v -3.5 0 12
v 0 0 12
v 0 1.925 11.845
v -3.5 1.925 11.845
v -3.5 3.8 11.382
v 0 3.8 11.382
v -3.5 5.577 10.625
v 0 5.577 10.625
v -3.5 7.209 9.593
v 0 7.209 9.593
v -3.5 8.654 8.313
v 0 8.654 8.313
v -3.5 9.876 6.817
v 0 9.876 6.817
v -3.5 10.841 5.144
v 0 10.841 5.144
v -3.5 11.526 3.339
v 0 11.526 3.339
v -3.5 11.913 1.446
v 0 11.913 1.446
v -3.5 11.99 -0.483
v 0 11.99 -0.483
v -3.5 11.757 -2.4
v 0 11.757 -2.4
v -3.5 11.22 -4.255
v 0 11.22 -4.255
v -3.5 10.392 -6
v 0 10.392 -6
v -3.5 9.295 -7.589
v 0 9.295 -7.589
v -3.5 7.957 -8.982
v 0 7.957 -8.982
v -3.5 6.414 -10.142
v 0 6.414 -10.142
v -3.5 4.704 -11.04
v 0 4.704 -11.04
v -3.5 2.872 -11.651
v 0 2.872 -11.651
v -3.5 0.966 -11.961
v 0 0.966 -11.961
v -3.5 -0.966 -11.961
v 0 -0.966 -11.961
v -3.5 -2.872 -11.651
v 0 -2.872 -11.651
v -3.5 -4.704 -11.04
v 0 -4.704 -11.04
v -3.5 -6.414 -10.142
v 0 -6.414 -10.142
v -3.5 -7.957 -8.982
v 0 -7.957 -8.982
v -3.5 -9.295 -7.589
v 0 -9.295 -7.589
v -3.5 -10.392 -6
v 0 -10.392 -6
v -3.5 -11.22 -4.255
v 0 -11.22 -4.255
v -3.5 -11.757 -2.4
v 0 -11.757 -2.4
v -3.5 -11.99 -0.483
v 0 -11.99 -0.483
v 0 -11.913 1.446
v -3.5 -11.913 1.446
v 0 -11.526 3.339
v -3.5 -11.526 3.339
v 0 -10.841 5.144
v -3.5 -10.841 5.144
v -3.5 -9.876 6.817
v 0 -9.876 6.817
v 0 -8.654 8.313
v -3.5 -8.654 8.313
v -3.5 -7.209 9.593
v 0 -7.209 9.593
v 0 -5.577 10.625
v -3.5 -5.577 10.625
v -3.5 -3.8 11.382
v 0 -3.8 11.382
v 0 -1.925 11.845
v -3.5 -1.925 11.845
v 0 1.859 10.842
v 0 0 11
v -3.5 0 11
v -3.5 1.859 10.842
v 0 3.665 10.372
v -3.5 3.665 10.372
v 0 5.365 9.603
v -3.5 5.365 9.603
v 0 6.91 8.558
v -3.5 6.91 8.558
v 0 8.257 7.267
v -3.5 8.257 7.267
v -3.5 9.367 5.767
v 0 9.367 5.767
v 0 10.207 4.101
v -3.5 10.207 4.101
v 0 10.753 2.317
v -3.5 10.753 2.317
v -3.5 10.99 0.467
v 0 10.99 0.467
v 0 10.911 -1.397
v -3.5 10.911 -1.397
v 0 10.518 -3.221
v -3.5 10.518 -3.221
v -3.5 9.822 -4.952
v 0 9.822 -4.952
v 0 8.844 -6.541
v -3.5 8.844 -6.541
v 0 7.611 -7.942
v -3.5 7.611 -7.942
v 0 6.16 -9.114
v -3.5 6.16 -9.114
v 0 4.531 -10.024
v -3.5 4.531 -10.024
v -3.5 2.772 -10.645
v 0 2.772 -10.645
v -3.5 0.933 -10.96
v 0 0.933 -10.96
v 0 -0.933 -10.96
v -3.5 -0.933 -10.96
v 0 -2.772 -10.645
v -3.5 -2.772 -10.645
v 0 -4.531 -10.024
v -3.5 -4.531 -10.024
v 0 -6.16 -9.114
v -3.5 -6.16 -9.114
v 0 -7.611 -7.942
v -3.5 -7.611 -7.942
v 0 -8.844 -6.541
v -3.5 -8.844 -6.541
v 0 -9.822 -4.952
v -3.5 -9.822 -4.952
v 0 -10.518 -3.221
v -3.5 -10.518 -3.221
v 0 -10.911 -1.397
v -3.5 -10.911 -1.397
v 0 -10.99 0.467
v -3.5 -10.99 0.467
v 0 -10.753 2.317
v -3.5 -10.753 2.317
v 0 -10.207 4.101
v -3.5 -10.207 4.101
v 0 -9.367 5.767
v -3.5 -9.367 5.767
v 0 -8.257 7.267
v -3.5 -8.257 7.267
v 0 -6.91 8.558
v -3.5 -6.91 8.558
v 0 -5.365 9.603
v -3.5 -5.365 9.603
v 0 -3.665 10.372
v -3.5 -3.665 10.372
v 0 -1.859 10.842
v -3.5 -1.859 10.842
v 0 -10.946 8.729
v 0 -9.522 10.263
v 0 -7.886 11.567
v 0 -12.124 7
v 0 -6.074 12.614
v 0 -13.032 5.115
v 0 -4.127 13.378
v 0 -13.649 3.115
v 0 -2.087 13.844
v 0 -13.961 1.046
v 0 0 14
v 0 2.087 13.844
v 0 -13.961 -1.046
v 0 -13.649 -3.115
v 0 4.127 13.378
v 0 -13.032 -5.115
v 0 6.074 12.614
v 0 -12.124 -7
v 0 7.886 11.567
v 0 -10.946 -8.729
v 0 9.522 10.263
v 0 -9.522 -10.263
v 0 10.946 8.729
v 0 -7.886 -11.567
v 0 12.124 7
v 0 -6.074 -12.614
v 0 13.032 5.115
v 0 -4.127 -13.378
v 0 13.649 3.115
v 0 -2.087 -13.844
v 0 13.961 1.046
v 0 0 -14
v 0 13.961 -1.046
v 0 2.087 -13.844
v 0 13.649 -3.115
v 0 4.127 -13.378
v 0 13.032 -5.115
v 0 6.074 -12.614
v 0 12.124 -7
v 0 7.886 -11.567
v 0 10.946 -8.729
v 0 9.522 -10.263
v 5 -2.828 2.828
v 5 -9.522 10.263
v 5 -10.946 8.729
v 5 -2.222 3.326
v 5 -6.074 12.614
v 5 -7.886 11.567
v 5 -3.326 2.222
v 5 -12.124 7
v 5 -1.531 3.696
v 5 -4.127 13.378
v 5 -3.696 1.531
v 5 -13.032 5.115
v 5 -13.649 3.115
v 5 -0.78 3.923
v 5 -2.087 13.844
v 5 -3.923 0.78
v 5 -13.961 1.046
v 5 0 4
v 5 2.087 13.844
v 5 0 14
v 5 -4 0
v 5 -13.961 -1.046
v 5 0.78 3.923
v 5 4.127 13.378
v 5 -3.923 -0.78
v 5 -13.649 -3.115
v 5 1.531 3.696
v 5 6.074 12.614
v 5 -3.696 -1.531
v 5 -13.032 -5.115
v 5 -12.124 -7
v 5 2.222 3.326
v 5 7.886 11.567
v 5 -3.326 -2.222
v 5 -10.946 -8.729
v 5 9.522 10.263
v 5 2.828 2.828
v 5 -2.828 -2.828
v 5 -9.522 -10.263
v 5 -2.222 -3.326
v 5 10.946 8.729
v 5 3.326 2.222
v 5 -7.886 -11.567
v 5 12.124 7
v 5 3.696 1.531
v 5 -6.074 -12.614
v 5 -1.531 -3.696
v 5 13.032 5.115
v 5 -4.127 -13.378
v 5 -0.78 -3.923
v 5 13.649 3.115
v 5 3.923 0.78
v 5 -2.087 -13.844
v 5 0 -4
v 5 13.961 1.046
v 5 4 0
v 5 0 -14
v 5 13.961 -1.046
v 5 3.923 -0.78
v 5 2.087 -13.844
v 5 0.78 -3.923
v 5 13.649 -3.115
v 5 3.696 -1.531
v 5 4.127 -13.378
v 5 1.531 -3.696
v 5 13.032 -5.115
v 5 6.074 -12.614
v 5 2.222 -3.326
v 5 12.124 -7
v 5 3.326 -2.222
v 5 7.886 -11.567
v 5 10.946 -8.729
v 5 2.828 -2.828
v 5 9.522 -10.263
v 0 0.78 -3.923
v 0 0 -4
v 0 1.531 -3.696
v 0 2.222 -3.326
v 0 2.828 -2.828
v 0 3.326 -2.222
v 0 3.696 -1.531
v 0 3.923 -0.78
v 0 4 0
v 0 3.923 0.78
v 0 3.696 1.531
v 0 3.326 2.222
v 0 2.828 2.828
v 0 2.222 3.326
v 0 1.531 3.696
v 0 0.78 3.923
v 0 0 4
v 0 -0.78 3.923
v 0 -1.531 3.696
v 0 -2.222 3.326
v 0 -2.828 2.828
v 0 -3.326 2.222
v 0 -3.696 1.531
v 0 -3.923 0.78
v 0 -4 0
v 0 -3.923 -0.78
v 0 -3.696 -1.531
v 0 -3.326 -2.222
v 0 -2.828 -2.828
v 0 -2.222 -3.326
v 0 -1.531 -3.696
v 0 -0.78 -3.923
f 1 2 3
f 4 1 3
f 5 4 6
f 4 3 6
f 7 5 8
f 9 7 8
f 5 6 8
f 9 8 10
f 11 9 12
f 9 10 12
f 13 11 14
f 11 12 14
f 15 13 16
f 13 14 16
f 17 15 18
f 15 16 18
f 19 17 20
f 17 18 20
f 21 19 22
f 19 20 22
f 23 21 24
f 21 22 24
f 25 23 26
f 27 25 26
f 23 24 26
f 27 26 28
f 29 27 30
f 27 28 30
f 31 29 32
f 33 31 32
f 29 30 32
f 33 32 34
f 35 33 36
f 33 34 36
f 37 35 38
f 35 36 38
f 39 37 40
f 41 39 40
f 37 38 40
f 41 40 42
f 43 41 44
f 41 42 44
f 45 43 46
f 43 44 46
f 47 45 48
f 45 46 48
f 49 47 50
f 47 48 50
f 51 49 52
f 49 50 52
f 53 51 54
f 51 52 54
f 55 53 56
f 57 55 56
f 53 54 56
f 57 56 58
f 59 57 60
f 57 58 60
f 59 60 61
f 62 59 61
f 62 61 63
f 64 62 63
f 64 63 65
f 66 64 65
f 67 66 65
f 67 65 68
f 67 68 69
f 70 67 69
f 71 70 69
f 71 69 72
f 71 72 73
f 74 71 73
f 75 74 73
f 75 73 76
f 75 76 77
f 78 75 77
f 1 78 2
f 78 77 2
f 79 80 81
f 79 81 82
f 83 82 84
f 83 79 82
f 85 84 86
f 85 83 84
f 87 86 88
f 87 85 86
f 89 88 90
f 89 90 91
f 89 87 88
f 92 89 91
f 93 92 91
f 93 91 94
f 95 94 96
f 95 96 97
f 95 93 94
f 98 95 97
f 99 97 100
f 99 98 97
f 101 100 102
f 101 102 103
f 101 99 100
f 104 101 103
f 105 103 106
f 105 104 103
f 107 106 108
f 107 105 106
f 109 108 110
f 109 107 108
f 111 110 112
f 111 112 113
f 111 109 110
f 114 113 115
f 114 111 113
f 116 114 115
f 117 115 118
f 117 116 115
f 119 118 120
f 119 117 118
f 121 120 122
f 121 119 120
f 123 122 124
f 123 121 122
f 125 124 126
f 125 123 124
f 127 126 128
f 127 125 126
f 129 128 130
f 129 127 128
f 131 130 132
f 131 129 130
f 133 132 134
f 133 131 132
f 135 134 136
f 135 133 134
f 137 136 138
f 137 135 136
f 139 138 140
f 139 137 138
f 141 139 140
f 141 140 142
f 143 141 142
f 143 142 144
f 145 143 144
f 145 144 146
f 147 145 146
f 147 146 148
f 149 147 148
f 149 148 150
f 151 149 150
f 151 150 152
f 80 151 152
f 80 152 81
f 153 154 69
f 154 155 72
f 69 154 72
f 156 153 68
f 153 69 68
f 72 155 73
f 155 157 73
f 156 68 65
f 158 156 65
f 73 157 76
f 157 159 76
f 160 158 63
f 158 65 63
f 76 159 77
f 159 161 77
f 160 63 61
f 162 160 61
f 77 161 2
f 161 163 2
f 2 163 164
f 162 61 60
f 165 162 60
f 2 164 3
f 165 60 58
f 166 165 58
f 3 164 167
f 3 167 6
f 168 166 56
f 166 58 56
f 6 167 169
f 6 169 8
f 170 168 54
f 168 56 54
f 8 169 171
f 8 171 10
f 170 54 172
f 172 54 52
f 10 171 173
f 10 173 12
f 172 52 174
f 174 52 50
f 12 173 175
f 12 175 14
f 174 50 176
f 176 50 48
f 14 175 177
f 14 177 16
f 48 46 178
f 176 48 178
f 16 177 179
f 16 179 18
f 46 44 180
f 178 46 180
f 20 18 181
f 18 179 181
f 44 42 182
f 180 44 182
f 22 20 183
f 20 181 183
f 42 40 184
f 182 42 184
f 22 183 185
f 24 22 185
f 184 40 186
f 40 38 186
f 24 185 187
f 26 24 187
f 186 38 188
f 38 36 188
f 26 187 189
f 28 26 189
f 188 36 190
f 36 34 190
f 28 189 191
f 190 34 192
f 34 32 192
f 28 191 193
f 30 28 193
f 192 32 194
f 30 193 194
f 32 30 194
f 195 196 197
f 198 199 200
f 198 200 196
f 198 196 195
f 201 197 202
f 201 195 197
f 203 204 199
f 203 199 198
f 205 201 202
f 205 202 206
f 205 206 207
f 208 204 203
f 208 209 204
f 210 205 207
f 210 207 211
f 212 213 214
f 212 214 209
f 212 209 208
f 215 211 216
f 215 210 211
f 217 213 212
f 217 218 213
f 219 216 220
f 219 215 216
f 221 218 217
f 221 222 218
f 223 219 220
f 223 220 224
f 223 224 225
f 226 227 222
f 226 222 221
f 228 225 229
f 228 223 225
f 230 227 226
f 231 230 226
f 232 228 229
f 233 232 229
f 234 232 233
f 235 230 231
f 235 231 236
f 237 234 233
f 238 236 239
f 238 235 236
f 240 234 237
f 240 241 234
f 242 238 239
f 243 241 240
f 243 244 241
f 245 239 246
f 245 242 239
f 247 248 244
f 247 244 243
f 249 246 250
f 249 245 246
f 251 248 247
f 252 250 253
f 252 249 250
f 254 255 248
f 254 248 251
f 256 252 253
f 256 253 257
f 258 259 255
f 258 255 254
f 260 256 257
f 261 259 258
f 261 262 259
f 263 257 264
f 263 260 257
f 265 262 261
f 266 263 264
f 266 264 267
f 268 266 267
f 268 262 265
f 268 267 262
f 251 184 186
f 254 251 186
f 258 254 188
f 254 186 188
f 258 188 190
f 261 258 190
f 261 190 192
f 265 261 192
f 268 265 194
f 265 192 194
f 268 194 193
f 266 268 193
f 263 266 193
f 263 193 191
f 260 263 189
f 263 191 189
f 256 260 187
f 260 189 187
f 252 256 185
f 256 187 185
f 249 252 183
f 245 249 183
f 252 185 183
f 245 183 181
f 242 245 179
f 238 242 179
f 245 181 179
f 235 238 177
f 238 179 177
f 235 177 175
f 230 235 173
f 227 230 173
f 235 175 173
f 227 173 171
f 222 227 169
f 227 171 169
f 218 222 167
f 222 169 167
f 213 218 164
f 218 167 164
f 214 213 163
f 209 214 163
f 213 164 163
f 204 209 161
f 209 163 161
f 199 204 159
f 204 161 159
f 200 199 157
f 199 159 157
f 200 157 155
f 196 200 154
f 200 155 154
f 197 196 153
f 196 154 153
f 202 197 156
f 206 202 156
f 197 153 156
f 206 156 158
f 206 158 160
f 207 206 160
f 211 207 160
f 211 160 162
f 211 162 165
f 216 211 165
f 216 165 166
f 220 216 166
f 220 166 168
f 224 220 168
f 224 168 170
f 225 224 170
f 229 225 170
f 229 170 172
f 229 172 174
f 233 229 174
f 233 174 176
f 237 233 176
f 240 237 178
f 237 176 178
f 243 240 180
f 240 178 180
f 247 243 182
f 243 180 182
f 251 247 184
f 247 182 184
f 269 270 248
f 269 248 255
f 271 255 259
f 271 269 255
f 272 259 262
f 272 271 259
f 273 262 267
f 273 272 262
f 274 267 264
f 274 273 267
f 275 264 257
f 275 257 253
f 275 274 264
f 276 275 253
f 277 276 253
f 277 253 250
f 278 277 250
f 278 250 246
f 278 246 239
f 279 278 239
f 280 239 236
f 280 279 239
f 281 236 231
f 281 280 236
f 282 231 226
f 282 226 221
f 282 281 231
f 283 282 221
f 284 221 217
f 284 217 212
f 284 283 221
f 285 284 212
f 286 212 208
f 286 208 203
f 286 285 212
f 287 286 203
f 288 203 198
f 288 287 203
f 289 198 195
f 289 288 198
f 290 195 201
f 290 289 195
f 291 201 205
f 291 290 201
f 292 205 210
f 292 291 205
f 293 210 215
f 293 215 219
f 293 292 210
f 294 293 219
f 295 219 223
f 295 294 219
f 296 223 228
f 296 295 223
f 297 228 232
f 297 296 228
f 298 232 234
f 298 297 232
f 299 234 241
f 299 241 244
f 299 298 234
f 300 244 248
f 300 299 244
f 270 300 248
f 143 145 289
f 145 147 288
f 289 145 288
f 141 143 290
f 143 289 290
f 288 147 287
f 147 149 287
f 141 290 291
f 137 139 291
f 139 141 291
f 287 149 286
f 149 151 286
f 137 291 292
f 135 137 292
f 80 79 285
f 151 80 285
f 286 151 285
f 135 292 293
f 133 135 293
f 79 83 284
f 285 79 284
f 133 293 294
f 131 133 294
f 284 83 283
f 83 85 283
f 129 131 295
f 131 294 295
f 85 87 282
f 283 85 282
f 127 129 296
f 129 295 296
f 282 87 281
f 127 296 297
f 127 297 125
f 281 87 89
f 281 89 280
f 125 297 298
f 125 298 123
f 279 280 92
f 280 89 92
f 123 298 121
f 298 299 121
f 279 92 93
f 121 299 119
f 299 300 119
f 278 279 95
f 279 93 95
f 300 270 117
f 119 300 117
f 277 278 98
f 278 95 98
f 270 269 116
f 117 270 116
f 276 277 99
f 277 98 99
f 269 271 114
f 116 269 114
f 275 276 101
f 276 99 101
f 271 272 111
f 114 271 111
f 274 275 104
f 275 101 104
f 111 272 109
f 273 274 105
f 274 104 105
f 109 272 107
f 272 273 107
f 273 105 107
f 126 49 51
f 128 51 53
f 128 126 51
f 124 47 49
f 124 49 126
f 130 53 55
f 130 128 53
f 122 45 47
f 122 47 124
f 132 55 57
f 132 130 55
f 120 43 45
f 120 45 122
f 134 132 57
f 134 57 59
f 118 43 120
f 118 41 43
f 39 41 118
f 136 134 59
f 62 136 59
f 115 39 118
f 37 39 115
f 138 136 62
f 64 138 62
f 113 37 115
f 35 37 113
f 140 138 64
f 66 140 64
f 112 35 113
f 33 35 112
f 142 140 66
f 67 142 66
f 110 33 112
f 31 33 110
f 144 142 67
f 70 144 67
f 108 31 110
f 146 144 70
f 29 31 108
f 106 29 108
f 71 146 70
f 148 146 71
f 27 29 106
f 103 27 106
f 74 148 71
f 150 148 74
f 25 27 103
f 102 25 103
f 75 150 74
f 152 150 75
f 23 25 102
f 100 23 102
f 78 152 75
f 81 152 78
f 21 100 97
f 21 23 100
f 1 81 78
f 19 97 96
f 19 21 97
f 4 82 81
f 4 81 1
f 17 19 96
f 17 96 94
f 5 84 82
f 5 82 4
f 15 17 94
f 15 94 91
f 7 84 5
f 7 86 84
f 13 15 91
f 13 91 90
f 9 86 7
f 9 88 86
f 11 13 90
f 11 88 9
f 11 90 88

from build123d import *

# Parameters (mm, degrees)
CROQUIS1_R              = 14
CROQUIS1_R_2            = 4
SALIENTE_EXTRUIR1_DEPTH = 5
CROQUIS2_R              = 12
CROQUIS2_R_2            = 11
SALIENTE_EXTRUIR2_DEPTH = 3.5


with BuildPart() as part:
    # Croquis1 → Saliente-Extruir1 (new body)
    with BuildSketch(Plane(origin=(0, 0, 0), x_dir=(0, 0, -1), z_dir=(1, 0, 0))):
        Circle(CROQUIS1_R)
        Circle(CROQUIS1_R_2, mode=Mode.SUBTRACT)
    extrude(amount=SALIENTE_EXTRUIR1_DEPTH)

    # Croquis2 → Saliente-Extruir2 (add)
    with BuildSketch(Plane.ZY):
        Circle(CROQUIS2_R)
        Circle(CROQUIS2_R_2, mode=Mode.SUBTRACT)
    extrude(amount=SALIENTE_EXTRUIR2_DEPTH)


solid = part.part
